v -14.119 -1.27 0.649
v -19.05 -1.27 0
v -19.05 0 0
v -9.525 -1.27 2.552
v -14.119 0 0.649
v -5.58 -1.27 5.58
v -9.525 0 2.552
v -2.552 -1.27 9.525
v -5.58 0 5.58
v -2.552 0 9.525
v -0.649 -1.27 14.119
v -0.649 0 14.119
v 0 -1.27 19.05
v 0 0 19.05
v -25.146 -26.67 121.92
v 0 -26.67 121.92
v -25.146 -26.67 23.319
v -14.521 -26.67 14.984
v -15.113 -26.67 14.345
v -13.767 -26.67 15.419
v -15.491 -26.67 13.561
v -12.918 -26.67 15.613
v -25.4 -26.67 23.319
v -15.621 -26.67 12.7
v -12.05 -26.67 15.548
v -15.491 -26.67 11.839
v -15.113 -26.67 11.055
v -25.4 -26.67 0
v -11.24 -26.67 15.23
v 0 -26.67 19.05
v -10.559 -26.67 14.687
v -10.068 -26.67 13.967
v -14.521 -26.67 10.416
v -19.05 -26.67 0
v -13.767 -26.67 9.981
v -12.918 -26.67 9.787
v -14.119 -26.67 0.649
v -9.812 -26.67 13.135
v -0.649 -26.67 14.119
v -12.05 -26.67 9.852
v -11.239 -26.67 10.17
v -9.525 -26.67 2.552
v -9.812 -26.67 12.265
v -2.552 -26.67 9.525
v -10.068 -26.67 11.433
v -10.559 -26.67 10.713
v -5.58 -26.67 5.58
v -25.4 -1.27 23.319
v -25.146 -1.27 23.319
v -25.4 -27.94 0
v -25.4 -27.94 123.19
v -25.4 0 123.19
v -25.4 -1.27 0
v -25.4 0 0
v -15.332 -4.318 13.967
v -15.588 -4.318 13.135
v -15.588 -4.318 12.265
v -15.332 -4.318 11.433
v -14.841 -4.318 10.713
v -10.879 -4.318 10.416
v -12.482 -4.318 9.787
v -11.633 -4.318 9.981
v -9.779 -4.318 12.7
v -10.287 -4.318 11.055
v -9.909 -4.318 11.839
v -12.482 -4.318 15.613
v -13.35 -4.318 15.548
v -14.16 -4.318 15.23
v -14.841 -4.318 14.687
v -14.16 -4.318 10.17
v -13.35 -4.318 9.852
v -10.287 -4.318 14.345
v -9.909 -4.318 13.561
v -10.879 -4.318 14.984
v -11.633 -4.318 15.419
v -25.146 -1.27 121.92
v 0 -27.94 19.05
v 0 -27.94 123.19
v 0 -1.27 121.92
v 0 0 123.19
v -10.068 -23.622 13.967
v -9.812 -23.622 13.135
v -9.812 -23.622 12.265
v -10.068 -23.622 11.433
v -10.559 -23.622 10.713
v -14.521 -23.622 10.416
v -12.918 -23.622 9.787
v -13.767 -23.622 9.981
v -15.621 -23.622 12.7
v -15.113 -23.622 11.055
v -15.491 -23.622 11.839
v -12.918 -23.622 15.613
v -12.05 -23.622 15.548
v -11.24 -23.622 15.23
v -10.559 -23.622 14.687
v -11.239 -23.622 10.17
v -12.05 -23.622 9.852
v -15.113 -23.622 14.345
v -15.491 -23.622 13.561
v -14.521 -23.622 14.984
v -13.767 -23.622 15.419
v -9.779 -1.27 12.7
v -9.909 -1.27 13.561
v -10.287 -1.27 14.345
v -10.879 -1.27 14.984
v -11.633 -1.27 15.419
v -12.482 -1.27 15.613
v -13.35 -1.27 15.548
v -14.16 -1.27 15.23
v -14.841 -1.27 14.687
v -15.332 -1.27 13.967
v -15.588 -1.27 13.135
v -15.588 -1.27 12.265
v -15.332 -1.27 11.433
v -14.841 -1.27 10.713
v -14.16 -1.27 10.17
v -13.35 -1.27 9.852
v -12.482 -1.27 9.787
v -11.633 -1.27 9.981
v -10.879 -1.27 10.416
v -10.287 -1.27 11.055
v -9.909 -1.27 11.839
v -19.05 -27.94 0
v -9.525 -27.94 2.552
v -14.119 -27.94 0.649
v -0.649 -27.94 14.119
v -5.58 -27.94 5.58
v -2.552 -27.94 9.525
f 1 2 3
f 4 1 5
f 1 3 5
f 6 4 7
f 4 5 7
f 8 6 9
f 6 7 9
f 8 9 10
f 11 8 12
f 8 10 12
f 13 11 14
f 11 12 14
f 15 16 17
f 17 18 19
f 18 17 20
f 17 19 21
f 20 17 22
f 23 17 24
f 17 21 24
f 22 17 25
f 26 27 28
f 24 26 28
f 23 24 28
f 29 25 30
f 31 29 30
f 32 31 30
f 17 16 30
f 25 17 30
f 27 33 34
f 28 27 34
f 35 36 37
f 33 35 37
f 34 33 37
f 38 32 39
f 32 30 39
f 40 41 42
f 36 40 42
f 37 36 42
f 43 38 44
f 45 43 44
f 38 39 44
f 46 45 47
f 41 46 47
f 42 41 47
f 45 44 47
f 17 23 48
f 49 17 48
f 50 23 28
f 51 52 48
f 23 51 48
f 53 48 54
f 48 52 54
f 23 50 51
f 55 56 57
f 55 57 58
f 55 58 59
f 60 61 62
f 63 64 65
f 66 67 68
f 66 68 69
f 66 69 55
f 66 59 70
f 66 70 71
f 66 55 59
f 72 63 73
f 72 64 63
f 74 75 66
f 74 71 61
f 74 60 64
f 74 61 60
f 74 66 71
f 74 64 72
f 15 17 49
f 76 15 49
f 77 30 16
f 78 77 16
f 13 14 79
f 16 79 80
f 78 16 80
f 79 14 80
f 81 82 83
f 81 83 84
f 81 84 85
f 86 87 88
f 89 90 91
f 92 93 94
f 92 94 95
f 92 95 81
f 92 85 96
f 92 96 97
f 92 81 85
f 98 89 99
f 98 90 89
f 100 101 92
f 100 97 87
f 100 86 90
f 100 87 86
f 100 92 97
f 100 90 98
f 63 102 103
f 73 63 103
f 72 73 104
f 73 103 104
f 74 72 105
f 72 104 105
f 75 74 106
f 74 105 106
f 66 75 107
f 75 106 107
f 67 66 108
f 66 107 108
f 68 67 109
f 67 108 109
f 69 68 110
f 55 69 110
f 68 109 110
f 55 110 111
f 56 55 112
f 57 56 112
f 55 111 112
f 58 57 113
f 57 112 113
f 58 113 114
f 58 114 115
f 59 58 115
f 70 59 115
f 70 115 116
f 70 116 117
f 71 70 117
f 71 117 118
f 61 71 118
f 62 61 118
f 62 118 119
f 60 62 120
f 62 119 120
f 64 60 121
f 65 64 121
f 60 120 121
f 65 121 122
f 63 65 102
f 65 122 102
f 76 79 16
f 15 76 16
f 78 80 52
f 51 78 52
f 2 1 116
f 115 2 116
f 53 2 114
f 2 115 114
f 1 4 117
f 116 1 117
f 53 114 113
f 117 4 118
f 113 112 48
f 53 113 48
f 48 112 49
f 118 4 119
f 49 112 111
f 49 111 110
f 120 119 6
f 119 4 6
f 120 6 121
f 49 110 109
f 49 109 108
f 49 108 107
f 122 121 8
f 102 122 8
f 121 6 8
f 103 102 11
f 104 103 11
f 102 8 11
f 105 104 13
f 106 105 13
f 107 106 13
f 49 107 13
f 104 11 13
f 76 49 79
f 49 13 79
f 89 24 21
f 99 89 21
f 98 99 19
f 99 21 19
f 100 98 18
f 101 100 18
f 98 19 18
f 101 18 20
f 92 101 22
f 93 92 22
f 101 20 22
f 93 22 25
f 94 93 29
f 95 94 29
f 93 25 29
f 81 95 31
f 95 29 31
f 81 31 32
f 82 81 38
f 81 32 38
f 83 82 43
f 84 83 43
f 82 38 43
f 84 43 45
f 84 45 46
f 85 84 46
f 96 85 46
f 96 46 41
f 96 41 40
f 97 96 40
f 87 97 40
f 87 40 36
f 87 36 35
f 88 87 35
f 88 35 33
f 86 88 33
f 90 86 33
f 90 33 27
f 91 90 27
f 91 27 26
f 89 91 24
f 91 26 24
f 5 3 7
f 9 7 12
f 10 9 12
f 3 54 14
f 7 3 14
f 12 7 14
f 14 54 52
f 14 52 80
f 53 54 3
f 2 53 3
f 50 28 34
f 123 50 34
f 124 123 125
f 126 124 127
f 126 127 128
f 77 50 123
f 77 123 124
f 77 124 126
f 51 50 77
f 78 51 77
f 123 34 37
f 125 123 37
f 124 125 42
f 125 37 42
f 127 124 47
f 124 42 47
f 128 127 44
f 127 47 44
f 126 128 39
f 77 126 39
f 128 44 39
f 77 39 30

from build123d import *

# Parameters (mm, degrees)
F1_DEPTH = 27.94
F3_DEPTH = 25.146
F4_R     = 2.921
F6_DEPTH = 3.048
F5_R     = 2.921
F7_DEPTH = 3.048
F9_DEPTH = 5.08


with BuildPart() as f1:
    # F0 (on Front) → F1 (new body)
    with BuildSketch(Plane.XZ):
        with BuildLine():
            Line((0, 123.19), (-25.4, 123.19))
            Line((-25.4, 123.19), (-25.4, 0))
            Line((-25.4, 0), (-19.05, 0))
            ThreePointArc((-19.05, 0), (-5.579616, 5.579616), (0, 19.05))
            Line((0, 19.05), (0, 123.19))
        make_face()
    extrude(amount=F1_DEPTH)

    # F2 (on face) → F3 (cut)
    with BuildSketch(Plane.YZ):
        Polygon((-1.27, -9.116447), (-1.27, 19.05), (-26.67, 19.05), (-26.67, -8.348415), align=None)
        Polygon((-1.27, 19.05), (-1.27, 20.321167), (-1.27, 121.92), (-26.67, 121.92), (-26.67, 20.32), (-26.67, 19.05), align=None)
    extrude(amount=-F3_DEPTH, mode=Mode.SUBTRACT)

    # F4 (on face) → F6 (join)
    with BuildSketch(Plane(origin=(0, -26.67, 0), x_dir=(-1, 0, 0), z_dir=(0, 1, 0))):
        with Locations((12.7, 12.7)):
            Circle(F4_R)
    extrude(amount=F6_DEPTH)

    # F5 (on face) → F7 (join)
    with BuildSketch(Plane.XZ.offset(1.27)):
        with Locations((-12.7, 12.7)):
            Circle(F5_R)
    extrude(amount=F7_DEPTH)

    # F8 (on face) → F9 (cut)
    with BuildSketch(Plane(origin=(-25.4, 0, 0), x_dir=(0, -1, 0), z_dir=(-1, 0, 0))):
        Polygon((26.67, 23.318777), (1.27, 23.318777), (1.27, 0.254), (1.27, 0), (26.67, 0), (26.67, 0.254), align=None)
    extrude(amount=-F9_DEPTH, mode=Mode.SUBTRACT)


solid = f1.part
